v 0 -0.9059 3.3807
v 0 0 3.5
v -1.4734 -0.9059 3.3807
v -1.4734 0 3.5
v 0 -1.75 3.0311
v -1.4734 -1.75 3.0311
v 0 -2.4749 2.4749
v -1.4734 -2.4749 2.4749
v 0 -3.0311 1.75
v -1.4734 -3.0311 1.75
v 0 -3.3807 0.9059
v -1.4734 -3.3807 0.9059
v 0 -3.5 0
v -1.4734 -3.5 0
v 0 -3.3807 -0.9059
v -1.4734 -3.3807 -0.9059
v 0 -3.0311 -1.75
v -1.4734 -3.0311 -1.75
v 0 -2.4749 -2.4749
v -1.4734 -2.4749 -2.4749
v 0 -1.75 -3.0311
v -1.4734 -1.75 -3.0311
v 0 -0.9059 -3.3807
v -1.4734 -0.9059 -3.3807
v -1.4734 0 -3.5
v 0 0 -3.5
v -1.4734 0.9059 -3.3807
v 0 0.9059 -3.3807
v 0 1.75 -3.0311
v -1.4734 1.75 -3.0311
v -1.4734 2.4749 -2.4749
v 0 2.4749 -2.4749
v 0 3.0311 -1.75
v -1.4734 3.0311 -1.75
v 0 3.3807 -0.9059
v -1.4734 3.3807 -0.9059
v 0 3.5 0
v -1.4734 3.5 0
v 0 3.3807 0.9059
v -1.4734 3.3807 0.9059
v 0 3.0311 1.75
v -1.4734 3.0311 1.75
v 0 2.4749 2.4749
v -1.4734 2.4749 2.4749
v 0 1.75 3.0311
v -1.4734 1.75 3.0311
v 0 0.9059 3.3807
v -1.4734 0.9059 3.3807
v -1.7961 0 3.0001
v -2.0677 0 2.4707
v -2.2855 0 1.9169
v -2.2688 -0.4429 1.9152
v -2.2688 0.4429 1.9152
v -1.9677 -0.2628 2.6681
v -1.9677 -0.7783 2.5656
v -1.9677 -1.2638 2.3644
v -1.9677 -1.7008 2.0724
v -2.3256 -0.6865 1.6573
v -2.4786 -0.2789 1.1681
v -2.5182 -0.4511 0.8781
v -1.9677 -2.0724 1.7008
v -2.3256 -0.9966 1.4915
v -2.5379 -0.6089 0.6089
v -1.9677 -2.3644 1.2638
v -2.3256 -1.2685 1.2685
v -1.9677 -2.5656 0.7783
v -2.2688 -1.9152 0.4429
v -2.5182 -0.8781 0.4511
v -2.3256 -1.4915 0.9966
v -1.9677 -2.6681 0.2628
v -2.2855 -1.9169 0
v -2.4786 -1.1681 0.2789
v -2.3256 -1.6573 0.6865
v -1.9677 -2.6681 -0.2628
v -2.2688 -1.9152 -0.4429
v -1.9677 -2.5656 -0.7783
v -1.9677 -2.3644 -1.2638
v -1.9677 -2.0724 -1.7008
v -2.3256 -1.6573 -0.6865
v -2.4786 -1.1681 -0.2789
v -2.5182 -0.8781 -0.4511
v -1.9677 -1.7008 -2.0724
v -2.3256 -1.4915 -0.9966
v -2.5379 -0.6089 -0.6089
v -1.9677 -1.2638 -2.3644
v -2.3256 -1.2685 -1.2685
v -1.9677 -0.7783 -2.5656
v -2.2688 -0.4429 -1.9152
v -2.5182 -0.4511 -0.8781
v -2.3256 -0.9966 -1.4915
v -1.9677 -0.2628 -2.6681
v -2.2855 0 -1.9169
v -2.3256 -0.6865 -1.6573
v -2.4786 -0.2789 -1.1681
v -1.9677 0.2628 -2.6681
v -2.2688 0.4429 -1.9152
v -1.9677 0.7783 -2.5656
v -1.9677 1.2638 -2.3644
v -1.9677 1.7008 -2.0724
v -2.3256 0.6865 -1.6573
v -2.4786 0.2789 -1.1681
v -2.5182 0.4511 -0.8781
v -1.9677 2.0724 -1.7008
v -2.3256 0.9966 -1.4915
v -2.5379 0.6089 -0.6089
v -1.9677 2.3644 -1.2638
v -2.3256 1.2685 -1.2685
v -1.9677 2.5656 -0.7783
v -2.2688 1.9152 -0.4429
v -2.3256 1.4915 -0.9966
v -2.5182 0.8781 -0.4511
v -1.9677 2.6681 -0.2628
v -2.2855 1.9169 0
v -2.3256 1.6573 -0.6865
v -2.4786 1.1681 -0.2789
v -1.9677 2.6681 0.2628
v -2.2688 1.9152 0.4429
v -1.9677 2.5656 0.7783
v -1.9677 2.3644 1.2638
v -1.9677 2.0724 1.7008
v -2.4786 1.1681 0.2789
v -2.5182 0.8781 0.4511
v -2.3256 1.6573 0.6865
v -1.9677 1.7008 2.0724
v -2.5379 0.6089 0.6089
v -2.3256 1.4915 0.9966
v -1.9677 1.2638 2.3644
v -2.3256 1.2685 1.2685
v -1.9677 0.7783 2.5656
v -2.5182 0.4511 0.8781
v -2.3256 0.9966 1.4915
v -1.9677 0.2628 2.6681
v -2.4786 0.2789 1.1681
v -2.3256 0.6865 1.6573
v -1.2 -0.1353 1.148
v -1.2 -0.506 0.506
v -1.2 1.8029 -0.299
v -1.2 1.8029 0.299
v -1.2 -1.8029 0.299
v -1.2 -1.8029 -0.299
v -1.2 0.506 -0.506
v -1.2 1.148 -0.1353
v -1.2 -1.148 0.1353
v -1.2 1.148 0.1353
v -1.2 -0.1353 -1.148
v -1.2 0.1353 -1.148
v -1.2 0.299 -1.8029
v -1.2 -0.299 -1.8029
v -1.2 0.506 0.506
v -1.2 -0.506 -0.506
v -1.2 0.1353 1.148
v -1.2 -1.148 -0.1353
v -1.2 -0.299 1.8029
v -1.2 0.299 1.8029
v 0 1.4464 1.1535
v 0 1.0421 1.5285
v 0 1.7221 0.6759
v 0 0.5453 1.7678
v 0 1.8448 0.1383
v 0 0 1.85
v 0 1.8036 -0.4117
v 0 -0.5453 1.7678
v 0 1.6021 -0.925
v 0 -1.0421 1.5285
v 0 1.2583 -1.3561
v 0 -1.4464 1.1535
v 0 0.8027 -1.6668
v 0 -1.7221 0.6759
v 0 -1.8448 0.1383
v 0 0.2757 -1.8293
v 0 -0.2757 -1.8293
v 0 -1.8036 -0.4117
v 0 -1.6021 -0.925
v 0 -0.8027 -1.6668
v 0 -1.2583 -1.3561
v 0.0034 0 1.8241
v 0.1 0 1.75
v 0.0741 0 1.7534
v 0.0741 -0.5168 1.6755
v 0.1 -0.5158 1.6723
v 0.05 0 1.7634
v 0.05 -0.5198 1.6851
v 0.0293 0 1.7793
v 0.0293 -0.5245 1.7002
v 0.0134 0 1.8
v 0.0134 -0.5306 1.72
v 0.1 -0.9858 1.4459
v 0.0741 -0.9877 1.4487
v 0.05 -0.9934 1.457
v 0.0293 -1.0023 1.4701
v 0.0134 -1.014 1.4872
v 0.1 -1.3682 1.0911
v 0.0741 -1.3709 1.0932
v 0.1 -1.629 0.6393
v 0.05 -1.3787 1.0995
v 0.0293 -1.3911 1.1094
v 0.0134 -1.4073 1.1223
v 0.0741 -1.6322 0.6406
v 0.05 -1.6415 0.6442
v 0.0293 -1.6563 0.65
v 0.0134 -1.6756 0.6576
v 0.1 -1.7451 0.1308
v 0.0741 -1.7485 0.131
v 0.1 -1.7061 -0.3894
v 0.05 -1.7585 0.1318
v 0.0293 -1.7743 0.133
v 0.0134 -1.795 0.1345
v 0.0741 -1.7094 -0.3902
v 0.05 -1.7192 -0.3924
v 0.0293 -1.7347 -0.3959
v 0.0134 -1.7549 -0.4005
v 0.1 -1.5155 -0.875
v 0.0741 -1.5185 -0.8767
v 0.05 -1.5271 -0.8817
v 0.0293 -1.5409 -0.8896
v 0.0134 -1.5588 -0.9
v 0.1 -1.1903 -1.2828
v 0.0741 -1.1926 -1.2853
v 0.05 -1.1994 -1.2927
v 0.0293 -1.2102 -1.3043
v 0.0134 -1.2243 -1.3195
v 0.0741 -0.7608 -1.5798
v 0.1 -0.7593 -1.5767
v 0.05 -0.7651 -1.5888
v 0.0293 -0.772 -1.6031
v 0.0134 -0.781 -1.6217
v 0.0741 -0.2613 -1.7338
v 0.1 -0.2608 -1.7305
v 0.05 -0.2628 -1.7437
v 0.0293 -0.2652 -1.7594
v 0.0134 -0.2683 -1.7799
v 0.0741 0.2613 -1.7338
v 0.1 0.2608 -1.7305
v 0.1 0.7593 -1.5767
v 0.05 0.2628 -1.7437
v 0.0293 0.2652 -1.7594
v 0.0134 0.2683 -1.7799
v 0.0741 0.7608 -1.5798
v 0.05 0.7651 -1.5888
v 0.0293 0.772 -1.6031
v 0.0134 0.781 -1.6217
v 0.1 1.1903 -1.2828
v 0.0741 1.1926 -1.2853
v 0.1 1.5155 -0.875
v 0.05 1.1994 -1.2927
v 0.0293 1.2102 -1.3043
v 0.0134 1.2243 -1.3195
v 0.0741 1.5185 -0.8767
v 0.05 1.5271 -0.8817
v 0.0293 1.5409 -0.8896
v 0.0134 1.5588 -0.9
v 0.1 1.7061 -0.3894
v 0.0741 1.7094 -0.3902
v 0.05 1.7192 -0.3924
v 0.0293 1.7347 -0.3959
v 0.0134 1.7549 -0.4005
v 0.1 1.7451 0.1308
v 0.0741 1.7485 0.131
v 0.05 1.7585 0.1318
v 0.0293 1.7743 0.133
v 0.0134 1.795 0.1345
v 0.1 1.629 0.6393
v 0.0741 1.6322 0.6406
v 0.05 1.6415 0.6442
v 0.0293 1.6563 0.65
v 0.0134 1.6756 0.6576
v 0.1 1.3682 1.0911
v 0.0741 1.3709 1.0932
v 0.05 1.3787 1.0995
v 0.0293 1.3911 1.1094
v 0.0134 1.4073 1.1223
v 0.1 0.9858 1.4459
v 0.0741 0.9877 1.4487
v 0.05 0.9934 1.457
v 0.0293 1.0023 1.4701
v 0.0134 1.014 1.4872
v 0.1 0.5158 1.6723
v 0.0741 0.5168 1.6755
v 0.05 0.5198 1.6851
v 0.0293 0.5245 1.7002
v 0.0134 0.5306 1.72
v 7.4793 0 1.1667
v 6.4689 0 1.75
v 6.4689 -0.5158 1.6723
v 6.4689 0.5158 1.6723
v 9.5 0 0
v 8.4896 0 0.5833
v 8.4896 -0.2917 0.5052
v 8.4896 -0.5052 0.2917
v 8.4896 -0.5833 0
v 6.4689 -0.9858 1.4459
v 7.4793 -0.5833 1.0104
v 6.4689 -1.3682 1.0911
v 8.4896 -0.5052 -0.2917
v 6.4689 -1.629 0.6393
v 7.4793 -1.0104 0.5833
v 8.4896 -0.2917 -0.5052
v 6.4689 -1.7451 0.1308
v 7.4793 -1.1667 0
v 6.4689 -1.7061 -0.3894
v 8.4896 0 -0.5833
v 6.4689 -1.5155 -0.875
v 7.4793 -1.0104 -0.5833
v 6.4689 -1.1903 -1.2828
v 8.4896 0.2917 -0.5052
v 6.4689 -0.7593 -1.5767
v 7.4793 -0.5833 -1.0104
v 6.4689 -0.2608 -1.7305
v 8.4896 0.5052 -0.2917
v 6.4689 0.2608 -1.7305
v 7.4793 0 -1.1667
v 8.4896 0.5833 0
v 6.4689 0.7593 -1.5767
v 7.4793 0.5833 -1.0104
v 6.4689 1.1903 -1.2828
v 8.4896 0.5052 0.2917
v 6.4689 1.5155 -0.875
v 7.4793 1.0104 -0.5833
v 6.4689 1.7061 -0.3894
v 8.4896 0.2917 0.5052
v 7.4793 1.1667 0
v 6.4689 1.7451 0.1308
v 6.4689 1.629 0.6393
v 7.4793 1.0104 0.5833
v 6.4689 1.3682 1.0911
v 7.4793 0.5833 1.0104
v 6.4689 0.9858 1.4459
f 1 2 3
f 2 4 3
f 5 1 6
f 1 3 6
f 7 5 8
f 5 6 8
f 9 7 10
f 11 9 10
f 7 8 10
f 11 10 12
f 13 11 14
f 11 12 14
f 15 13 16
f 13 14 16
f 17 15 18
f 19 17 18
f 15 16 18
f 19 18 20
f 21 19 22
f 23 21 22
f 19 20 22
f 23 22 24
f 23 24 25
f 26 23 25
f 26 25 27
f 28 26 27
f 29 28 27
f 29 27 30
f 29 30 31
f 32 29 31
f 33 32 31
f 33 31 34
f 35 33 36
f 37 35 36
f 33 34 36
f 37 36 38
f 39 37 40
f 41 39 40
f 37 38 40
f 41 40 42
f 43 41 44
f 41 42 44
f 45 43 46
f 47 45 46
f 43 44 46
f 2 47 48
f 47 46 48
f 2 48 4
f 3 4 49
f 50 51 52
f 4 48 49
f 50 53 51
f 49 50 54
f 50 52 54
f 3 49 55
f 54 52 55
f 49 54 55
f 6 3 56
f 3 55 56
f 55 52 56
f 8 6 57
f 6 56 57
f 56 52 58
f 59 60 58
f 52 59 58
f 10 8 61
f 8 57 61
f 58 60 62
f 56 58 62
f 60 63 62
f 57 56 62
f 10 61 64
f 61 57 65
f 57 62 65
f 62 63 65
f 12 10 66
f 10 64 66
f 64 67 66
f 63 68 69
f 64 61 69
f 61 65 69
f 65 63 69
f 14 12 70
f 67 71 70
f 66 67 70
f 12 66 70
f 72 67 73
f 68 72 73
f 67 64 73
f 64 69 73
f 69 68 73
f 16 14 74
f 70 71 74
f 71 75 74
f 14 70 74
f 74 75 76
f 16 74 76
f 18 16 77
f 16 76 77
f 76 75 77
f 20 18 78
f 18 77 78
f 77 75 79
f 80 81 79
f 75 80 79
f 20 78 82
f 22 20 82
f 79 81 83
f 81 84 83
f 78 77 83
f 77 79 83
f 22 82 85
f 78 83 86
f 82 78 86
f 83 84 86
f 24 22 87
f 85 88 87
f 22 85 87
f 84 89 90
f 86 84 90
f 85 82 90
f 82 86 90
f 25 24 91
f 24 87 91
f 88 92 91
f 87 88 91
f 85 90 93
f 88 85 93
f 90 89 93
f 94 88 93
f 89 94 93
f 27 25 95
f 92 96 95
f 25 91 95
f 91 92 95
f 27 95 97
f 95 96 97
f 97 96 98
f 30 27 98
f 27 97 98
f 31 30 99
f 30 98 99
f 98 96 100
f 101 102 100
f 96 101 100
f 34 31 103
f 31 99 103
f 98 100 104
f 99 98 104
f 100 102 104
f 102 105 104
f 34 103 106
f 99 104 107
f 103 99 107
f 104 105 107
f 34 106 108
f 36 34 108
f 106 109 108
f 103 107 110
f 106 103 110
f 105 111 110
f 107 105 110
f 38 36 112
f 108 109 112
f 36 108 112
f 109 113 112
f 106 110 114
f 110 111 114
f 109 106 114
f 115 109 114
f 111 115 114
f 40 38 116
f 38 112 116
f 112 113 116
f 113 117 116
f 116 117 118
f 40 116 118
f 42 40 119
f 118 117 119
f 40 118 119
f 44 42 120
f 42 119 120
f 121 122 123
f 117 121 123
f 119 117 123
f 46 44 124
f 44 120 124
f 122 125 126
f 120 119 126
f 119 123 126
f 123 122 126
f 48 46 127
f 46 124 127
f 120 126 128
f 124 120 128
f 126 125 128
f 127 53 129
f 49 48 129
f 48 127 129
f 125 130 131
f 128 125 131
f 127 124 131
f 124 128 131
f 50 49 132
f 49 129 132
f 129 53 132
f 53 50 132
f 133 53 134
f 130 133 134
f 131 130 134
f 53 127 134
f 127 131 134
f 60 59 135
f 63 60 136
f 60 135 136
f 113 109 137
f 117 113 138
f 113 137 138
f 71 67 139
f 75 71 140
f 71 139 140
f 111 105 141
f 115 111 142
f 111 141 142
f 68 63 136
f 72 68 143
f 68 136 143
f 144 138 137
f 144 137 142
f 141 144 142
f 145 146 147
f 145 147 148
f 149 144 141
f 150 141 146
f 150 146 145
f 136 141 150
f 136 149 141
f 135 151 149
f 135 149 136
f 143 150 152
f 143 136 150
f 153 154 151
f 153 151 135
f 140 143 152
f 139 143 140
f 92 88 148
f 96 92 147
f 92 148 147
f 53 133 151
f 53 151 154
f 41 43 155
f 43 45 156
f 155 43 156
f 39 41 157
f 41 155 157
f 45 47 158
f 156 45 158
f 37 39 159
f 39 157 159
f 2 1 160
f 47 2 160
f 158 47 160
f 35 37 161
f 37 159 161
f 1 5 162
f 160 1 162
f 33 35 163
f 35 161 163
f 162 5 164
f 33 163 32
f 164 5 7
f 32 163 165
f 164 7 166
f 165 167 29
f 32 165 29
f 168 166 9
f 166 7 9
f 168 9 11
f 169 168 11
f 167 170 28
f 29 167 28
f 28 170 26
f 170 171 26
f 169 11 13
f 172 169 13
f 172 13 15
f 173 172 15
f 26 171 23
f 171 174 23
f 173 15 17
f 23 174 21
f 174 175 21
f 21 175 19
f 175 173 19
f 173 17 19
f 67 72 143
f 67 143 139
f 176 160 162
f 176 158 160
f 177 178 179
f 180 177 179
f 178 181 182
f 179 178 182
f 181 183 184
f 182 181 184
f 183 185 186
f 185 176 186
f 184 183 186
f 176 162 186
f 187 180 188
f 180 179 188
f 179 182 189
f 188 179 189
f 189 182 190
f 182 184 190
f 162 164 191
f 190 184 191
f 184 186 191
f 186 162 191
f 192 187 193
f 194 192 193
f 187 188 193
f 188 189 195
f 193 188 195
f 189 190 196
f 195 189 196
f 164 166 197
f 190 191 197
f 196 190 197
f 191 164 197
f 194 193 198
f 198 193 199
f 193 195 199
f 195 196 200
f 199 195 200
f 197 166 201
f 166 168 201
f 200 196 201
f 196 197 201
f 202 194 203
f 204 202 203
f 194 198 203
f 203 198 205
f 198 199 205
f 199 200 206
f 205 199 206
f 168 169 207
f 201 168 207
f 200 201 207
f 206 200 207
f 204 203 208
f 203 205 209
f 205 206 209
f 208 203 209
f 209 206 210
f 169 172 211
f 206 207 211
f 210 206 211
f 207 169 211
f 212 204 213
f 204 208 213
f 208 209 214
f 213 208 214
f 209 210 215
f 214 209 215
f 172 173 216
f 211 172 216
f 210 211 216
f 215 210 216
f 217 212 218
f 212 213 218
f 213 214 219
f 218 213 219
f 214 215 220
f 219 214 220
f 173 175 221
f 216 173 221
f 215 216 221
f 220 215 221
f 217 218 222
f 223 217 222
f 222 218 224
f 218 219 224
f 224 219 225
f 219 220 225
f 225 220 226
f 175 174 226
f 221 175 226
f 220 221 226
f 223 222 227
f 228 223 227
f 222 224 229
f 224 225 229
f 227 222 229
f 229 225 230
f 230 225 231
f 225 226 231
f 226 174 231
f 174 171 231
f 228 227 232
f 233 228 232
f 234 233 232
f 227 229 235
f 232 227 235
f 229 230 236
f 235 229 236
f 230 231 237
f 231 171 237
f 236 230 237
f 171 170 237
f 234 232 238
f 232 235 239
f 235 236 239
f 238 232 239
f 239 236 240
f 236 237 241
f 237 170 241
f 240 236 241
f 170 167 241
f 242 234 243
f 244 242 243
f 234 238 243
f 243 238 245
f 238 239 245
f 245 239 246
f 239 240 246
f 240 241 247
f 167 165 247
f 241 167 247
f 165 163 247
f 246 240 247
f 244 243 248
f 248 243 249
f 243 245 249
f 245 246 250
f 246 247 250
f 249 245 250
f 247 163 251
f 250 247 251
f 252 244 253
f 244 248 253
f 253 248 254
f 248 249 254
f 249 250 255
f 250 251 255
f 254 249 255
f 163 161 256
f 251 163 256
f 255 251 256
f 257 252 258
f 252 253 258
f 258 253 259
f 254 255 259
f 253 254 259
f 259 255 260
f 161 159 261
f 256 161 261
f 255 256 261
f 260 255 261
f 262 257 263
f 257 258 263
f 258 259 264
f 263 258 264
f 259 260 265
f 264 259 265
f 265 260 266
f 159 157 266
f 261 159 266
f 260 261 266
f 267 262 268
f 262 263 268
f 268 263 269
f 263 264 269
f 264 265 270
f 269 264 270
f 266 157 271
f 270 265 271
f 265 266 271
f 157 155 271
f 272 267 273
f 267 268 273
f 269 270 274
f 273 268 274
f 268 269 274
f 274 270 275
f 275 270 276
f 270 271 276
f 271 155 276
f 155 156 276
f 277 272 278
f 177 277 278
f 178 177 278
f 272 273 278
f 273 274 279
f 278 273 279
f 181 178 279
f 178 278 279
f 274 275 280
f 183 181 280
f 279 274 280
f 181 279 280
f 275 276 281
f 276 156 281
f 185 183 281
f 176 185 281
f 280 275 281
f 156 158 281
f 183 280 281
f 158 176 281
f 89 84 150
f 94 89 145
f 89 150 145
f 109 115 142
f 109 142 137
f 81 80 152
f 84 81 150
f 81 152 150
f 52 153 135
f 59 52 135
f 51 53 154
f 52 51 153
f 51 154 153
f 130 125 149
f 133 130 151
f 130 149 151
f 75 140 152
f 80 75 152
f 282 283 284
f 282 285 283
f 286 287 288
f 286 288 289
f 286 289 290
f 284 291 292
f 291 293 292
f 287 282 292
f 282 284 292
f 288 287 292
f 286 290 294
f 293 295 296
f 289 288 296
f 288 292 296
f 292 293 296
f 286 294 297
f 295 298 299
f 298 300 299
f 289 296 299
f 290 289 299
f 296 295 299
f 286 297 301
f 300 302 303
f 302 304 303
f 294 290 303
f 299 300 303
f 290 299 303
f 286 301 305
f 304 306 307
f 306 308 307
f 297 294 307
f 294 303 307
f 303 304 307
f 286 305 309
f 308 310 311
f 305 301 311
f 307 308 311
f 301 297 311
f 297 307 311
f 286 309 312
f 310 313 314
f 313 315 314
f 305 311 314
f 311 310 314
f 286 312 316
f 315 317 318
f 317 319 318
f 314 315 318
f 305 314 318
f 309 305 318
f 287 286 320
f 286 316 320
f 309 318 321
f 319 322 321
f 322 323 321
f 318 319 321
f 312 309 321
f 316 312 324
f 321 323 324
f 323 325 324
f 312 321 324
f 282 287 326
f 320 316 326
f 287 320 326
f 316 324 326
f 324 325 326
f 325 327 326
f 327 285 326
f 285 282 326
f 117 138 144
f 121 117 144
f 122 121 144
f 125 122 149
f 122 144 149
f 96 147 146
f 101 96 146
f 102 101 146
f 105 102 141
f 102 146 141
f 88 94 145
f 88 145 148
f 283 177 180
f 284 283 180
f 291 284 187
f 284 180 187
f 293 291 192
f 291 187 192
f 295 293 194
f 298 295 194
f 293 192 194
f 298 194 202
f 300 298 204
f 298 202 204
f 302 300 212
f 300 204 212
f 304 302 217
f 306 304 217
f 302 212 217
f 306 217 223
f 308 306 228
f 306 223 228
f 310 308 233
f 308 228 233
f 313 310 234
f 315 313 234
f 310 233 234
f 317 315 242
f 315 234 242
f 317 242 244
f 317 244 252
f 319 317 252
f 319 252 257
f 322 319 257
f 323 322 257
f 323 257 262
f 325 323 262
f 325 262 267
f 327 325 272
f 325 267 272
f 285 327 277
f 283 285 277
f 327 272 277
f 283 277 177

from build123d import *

# Parameters (mm, degrees)
CHAMFER1_SIZE      = 0.35
CHAMFER1_SIZE2     = 0.606217783
CUT_EXTRUDE1_DEPTH = 1.4
CUT_EXTRUDE1_TAPER = 6
FILLET1_R          = 0.1


with BuildPart() as part:
    # Sketch1 → Revolve1 (revolve)
    with BuildSketch(Plane.XY, mode=Mode.PRIVATE) as revolve1_sk:
        with BuildLine():
            Line((0, 3.5), (-1.473397172, 3.5))
            ThreePointArc((-1.473397172, 3.5), (-2.311408891, 1.838425545), (-2.6, 0))
            Line((-2.6, 0), (9.5, 0))
            Line((9.5, 0), (9.5, 1.75))
            Line((9.5, 1.75), (0, 1.75))
            Line((0, 1.75), (0, 3.5))
        make_face()
    revolve(revolve1_sk.sketch.rotate(Axis((0, 0, 0), (1, 0, 0)), 90), axis=Axis((0, 0, 0), (1, 0, 0)))

    # Chamfer1
    chamfer1_edges = [part.edges().sort_by_distance(p)[0] for p in [
        (9.5, 0, -1.75),
    ]]
    chamfer1_side = [part.faces().sort_by_distance(p)[0] for p in [
        (9.5, 0, 0),
    ]]
    chamfer(chamfer1_edges, length=CHAMFER1_SIZE, length2=CHAMFER1_SIZE2, reference=chamfer1_side[0])

    # Sketch2 → EndCone (revolve, cut)
    with BuildSketch(Plane.XY, mode=Mode.PRIVATE) as endcone_sk:
        Polygon((9.5, 0), (6.468911087, 1.75), (6.468911087, 1.85), (9.6, 1.85), (9.6, 0), align=None)
    revolve(endcone_sk.sketch.rotate(Axis((0, 0, 0), (1, 0, 0)), 90), axis=Axis((0, 0, 0), (1, 0, 0)), mode=Mode.SUBTRACT)

    # Sketch3 → Cut-Extrude1 (cut)
    with BuildSketch(Plane(origin=(-2.6, 0, 0), x_dir=(0, 0, -1), z_dir=(1, 0, 0))):
        Polygon((-0.4875, 1.95), (-0.2925, 1.17), (-0.613687292, 0.613687292), (-1.17, 0.2925), (-1.95, 0.4875), (-1.95, -0.4875), (-1.17, -0.2925), (-0.613687292, -0.613687292), (-0.2925, -1.17), (-0.4875, -1.95), (0.4875, -1.95), (0.2925, -1.17), (0.613687292, -0.613687292), (1.17, -0.2925), (1.95, -0.4875), (1.95, 0.4875), (1.17, 0.2925), (0.613687292, 0.613687292), (0.2925, 1.17), (0.4875, 1.95), align=None)
    extrude(amount=CUT_EXTRUDE1_DEPTH, taper=CUT_EXTRUDE1_TAPER, mode=Mode.SUBTRACT)

    # Fillet1
    fillet1_edges = [part.edges().sort_by_distance(p)[0] for p in [
        (0, 0, -1.75),
    ]]
    fillet(fillet1_edges, radius=FILLET1_R)


solid = part.part
